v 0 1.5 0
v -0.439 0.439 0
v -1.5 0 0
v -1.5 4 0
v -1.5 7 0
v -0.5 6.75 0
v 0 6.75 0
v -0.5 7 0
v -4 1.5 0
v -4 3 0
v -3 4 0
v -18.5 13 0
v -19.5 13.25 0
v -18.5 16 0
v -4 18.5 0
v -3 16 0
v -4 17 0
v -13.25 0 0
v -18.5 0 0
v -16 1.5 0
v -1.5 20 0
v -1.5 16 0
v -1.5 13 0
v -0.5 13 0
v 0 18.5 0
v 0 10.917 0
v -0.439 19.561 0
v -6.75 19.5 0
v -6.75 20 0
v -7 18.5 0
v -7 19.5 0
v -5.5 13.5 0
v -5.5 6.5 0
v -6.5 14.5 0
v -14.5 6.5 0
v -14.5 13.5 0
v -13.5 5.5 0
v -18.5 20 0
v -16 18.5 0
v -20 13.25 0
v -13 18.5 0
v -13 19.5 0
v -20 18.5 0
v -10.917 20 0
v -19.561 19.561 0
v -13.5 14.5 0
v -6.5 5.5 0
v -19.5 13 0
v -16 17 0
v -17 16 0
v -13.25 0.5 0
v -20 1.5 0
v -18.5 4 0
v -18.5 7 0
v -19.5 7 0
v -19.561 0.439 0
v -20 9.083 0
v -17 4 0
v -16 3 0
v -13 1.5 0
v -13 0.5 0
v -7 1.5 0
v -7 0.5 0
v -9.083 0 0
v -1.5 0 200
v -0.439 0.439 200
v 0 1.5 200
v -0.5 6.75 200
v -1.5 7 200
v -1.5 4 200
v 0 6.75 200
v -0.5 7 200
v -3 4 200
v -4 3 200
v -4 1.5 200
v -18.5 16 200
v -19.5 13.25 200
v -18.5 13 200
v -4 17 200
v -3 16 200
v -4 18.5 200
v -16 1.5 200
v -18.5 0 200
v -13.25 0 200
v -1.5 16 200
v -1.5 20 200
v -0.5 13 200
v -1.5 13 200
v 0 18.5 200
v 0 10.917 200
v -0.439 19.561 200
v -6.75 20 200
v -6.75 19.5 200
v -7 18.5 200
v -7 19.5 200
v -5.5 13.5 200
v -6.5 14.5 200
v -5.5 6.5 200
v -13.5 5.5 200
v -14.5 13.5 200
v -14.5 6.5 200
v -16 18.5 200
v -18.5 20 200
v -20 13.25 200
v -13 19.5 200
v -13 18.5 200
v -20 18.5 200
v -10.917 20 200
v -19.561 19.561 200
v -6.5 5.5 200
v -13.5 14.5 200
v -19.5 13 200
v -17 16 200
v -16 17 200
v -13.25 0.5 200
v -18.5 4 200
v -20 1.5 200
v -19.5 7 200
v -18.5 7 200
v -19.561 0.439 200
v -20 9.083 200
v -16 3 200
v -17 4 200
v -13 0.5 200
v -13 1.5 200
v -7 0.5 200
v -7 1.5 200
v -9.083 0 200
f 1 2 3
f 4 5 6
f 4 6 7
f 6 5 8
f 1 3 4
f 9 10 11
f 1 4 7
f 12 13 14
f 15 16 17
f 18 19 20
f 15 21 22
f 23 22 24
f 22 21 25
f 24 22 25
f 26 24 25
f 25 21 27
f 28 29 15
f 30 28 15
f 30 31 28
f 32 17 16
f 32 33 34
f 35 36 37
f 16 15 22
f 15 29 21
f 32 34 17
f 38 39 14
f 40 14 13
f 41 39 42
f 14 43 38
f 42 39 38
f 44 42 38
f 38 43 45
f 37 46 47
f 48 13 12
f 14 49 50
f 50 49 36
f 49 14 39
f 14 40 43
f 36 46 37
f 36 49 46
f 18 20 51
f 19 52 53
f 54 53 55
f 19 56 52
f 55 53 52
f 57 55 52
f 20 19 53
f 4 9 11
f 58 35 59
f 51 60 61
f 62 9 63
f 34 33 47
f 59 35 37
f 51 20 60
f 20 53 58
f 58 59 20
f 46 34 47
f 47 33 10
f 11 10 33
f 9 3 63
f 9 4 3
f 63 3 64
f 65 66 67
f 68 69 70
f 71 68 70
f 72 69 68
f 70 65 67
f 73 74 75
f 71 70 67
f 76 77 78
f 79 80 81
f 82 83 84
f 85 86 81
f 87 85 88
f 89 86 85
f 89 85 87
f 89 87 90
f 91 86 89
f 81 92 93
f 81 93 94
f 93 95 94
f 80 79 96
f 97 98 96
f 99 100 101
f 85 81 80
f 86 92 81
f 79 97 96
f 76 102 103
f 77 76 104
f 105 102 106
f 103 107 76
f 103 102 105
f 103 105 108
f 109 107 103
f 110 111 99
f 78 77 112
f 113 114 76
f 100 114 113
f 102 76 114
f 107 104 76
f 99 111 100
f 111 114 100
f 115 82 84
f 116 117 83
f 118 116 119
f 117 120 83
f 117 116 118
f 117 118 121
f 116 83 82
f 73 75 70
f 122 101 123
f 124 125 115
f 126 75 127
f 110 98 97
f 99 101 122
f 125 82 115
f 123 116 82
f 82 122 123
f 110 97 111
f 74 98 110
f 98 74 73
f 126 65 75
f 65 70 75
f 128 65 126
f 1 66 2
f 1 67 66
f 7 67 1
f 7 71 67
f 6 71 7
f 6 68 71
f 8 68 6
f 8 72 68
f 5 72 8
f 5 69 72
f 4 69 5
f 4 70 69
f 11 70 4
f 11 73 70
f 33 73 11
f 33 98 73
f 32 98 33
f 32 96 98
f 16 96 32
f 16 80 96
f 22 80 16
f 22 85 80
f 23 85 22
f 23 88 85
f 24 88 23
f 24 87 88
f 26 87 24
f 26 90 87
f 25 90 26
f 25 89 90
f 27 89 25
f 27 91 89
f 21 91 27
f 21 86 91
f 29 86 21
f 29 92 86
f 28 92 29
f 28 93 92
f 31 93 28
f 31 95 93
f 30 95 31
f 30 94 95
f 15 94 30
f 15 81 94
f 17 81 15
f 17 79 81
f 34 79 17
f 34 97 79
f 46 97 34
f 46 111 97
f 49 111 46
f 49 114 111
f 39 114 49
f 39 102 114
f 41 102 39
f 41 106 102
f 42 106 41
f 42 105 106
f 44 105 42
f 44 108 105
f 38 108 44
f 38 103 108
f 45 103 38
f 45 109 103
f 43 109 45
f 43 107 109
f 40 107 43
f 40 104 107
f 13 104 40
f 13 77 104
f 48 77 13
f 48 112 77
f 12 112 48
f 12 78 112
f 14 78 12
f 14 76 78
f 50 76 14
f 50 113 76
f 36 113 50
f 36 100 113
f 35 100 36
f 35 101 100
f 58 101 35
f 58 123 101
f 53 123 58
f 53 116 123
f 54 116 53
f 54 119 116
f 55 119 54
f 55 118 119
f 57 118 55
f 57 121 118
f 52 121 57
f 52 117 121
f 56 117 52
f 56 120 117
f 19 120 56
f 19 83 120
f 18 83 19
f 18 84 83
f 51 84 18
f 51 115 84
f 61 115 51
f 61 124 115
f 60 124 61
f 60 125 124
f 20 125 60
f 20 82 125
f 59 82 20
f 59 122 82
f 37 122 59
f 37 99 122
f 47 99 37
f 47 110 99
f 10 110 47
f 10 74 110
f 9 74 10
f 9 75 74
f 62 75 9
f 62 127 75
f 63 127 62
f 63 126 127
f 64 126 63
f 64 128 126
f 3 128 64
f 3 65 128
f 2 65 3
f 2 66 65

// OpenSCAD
// A B6 profile

module cutoutB6(){
// Main cutout
maxSlotWidth = 12;
minSlotWidth = 7;
slotDepth = 5.5;
slotStartDepth = 1.5;
slotOpening = 6;
profileWidth = 20;

frontCutWidth = 6.5;
frontCutDepth = 0.5;

innerCoreRadius = 2.75;
outerCoreRadius = 3.55;

roundEdgeRadius = 1.5;

center = [profileWidth/2,profileWidth/2];
depthStartAngle = slotDepth-(maxSlotWidth-minSlotWidth)/2;
    
cutout = [
    [(profileWidth-frontCutWidth)/2,-1],
    [(profileWidth-frontCutWidth)/2,frontCutDepth],
    [(profileWidth-slotOpening)/2,frontCutDepth],
    [(profileWidth-slotOpening)/2,slotStartDepth],
    [(profileWidth-maxSlotWidth)/2,slotStartDepth],
    [(profileWidth-maxSlotWidth)/2, depthStartAngle],
    [(profileWidth-minSlotWidth)/2,slotDepth],
    [profileWidth/2-1,slotDepth],
    [profileWidth/2,slotDepth+0.5],
    [profileWidth/2+1,slotDepth],
    [profileWidth-(profileWidth-minSlotWidth)/2,slotDepth],
    [profileWidth-(profileWidth-maxSlotWidth)/2,depthStartAngle],
    [profileWidth-(profileWidth-maxSlotWidth)/2,slotStartDepth],
    [profileWidth-(profileWidth-slotOpening)/2,slotStartDepth],
    [profileWidth-(profileWidth-slotOpening)/2,frontCutDepth],
    [profileWidth-(profileWidth-frontCutWidth)/2,frontCutDepth],
    [profileWidth-(profileWidth-frontCutWidth)/2,-1]
    ];
    
simpleCutout = [
    [(profileWidth-frontCutWidth)/2,-1],
    [(profileWidth-frontCutWidth)/2,frontCutDepth],
    [(profileWidth-slotOpening)/2,frontCutDepth],
    [(profileWidth-slotOpening)/2,slotStartDepth],
    [(profileWidth-maxSlotWidth)/2,slotStartDepth],
    [(profileWidth-maxSlotWidth)/2, depthStartAngle],
    [(profileWidth-minSlotWidth)/2,slotDepth],
//    [profileWidth/2-1,slotDepth],
//    [profileWidth/2,slotDepth+0.5],
//    [profileWidth/2+1,slotDepth],
    [profileWidth-(profileWidth-minSlotWidth)/2,slotDepth],
    [profileWidth-(profileWidth-maxSlotWidth)/2,depthStartAngle],
    [profileWidth-(profileWidth-maxSlotWidth)/2,slotStartDepth],
    [profileWidth-(profileWidth-slotOpening)/2,slotStartDepth],
    [profileWidth-(profileWidth-slotOpening)/2,frontCutDepth],
//    [profileWidth-(profileWidth-frontCutWidth)/2,frontCutDepth],
//    [profileWidth-(profileWidth-frontCutWidth)/2,-1]
    ];

for(i = [0:90:270])
translate(center)
rotate(i)
translate(-center)
//polygon(cutout);
polygon(simpleCutout);

// Core
/*translate(center)
circle($fn=16, innerCoreRadius);

translate(center)
difference(){
    circle($fn=16, outerCoreRadius);
    for(i = [0:90:270])
    rotate(i+45)
    translate([0.7,0.7])
    square(outerCoreRadius);
}*/

// Round edges
for(i = [0:90:270])
translate(center)
rotate(i)
translate(-center)
difference(){
    translate([-1,-1])
    square(roundEdgeRadius+1);
    translate([roundEdgeRadius,roundEdgeRadius])
    circle($fn=8, roundEdgeRadius);
}

}

module profileB6(length, center=false){
width = 20;
position = center? -[length/2,width/2,width/2] : [0,0,0];

translate(position)
translate([width/2,width/2,width/2])
rotate(90,[0,1,0])
translate(-[width/2,width/2,width/2])
linear_extrude(length)
difference(){
    square(width);
    cutoutB6();
}

}

module connectorB6(){
    profileWidth = 20;
    connectorWidth = 18;
    connectorHeight = 18;
    baseDepth = 3.7;
    wallDepth = 1;
    slotWidth = 6;
    holeWidth = 4.5;
    holeHeight = 7.2;
    
    center = [profileWidth/2,profileWidth/2,connectorHeight/2];
    
    translate([0,0,(profileWidth-connectorWidth)/2])
    difference(){
        cube([connectorHeight,connectorHeight,connectorWidth]);
        
        translate([baseDepth,baseDepth,wallDepth])
        cube([connectorHeight,connectorHeight,connectorWidth-(2*wallDepth)]);
        
        translate([connectorHeight+baseDepth,0,-1])
        rotate(45,[0,0,1])
        cube([connectorHeight*2,connectorHeight*2,connectorWidth+2]);
        
        for(i = [0,-90])
        translate(center)
        rotate(i)
        translate(-center)
        translate([profileWidth/2,baseDepth/2,connectorWidth/2])
        cube([holeHeight,baseDepth+2,holeWidth], center = true);
    }
    
}

rotate(90,[0,-1,0])
profileB6(200);

//connectorB6();
